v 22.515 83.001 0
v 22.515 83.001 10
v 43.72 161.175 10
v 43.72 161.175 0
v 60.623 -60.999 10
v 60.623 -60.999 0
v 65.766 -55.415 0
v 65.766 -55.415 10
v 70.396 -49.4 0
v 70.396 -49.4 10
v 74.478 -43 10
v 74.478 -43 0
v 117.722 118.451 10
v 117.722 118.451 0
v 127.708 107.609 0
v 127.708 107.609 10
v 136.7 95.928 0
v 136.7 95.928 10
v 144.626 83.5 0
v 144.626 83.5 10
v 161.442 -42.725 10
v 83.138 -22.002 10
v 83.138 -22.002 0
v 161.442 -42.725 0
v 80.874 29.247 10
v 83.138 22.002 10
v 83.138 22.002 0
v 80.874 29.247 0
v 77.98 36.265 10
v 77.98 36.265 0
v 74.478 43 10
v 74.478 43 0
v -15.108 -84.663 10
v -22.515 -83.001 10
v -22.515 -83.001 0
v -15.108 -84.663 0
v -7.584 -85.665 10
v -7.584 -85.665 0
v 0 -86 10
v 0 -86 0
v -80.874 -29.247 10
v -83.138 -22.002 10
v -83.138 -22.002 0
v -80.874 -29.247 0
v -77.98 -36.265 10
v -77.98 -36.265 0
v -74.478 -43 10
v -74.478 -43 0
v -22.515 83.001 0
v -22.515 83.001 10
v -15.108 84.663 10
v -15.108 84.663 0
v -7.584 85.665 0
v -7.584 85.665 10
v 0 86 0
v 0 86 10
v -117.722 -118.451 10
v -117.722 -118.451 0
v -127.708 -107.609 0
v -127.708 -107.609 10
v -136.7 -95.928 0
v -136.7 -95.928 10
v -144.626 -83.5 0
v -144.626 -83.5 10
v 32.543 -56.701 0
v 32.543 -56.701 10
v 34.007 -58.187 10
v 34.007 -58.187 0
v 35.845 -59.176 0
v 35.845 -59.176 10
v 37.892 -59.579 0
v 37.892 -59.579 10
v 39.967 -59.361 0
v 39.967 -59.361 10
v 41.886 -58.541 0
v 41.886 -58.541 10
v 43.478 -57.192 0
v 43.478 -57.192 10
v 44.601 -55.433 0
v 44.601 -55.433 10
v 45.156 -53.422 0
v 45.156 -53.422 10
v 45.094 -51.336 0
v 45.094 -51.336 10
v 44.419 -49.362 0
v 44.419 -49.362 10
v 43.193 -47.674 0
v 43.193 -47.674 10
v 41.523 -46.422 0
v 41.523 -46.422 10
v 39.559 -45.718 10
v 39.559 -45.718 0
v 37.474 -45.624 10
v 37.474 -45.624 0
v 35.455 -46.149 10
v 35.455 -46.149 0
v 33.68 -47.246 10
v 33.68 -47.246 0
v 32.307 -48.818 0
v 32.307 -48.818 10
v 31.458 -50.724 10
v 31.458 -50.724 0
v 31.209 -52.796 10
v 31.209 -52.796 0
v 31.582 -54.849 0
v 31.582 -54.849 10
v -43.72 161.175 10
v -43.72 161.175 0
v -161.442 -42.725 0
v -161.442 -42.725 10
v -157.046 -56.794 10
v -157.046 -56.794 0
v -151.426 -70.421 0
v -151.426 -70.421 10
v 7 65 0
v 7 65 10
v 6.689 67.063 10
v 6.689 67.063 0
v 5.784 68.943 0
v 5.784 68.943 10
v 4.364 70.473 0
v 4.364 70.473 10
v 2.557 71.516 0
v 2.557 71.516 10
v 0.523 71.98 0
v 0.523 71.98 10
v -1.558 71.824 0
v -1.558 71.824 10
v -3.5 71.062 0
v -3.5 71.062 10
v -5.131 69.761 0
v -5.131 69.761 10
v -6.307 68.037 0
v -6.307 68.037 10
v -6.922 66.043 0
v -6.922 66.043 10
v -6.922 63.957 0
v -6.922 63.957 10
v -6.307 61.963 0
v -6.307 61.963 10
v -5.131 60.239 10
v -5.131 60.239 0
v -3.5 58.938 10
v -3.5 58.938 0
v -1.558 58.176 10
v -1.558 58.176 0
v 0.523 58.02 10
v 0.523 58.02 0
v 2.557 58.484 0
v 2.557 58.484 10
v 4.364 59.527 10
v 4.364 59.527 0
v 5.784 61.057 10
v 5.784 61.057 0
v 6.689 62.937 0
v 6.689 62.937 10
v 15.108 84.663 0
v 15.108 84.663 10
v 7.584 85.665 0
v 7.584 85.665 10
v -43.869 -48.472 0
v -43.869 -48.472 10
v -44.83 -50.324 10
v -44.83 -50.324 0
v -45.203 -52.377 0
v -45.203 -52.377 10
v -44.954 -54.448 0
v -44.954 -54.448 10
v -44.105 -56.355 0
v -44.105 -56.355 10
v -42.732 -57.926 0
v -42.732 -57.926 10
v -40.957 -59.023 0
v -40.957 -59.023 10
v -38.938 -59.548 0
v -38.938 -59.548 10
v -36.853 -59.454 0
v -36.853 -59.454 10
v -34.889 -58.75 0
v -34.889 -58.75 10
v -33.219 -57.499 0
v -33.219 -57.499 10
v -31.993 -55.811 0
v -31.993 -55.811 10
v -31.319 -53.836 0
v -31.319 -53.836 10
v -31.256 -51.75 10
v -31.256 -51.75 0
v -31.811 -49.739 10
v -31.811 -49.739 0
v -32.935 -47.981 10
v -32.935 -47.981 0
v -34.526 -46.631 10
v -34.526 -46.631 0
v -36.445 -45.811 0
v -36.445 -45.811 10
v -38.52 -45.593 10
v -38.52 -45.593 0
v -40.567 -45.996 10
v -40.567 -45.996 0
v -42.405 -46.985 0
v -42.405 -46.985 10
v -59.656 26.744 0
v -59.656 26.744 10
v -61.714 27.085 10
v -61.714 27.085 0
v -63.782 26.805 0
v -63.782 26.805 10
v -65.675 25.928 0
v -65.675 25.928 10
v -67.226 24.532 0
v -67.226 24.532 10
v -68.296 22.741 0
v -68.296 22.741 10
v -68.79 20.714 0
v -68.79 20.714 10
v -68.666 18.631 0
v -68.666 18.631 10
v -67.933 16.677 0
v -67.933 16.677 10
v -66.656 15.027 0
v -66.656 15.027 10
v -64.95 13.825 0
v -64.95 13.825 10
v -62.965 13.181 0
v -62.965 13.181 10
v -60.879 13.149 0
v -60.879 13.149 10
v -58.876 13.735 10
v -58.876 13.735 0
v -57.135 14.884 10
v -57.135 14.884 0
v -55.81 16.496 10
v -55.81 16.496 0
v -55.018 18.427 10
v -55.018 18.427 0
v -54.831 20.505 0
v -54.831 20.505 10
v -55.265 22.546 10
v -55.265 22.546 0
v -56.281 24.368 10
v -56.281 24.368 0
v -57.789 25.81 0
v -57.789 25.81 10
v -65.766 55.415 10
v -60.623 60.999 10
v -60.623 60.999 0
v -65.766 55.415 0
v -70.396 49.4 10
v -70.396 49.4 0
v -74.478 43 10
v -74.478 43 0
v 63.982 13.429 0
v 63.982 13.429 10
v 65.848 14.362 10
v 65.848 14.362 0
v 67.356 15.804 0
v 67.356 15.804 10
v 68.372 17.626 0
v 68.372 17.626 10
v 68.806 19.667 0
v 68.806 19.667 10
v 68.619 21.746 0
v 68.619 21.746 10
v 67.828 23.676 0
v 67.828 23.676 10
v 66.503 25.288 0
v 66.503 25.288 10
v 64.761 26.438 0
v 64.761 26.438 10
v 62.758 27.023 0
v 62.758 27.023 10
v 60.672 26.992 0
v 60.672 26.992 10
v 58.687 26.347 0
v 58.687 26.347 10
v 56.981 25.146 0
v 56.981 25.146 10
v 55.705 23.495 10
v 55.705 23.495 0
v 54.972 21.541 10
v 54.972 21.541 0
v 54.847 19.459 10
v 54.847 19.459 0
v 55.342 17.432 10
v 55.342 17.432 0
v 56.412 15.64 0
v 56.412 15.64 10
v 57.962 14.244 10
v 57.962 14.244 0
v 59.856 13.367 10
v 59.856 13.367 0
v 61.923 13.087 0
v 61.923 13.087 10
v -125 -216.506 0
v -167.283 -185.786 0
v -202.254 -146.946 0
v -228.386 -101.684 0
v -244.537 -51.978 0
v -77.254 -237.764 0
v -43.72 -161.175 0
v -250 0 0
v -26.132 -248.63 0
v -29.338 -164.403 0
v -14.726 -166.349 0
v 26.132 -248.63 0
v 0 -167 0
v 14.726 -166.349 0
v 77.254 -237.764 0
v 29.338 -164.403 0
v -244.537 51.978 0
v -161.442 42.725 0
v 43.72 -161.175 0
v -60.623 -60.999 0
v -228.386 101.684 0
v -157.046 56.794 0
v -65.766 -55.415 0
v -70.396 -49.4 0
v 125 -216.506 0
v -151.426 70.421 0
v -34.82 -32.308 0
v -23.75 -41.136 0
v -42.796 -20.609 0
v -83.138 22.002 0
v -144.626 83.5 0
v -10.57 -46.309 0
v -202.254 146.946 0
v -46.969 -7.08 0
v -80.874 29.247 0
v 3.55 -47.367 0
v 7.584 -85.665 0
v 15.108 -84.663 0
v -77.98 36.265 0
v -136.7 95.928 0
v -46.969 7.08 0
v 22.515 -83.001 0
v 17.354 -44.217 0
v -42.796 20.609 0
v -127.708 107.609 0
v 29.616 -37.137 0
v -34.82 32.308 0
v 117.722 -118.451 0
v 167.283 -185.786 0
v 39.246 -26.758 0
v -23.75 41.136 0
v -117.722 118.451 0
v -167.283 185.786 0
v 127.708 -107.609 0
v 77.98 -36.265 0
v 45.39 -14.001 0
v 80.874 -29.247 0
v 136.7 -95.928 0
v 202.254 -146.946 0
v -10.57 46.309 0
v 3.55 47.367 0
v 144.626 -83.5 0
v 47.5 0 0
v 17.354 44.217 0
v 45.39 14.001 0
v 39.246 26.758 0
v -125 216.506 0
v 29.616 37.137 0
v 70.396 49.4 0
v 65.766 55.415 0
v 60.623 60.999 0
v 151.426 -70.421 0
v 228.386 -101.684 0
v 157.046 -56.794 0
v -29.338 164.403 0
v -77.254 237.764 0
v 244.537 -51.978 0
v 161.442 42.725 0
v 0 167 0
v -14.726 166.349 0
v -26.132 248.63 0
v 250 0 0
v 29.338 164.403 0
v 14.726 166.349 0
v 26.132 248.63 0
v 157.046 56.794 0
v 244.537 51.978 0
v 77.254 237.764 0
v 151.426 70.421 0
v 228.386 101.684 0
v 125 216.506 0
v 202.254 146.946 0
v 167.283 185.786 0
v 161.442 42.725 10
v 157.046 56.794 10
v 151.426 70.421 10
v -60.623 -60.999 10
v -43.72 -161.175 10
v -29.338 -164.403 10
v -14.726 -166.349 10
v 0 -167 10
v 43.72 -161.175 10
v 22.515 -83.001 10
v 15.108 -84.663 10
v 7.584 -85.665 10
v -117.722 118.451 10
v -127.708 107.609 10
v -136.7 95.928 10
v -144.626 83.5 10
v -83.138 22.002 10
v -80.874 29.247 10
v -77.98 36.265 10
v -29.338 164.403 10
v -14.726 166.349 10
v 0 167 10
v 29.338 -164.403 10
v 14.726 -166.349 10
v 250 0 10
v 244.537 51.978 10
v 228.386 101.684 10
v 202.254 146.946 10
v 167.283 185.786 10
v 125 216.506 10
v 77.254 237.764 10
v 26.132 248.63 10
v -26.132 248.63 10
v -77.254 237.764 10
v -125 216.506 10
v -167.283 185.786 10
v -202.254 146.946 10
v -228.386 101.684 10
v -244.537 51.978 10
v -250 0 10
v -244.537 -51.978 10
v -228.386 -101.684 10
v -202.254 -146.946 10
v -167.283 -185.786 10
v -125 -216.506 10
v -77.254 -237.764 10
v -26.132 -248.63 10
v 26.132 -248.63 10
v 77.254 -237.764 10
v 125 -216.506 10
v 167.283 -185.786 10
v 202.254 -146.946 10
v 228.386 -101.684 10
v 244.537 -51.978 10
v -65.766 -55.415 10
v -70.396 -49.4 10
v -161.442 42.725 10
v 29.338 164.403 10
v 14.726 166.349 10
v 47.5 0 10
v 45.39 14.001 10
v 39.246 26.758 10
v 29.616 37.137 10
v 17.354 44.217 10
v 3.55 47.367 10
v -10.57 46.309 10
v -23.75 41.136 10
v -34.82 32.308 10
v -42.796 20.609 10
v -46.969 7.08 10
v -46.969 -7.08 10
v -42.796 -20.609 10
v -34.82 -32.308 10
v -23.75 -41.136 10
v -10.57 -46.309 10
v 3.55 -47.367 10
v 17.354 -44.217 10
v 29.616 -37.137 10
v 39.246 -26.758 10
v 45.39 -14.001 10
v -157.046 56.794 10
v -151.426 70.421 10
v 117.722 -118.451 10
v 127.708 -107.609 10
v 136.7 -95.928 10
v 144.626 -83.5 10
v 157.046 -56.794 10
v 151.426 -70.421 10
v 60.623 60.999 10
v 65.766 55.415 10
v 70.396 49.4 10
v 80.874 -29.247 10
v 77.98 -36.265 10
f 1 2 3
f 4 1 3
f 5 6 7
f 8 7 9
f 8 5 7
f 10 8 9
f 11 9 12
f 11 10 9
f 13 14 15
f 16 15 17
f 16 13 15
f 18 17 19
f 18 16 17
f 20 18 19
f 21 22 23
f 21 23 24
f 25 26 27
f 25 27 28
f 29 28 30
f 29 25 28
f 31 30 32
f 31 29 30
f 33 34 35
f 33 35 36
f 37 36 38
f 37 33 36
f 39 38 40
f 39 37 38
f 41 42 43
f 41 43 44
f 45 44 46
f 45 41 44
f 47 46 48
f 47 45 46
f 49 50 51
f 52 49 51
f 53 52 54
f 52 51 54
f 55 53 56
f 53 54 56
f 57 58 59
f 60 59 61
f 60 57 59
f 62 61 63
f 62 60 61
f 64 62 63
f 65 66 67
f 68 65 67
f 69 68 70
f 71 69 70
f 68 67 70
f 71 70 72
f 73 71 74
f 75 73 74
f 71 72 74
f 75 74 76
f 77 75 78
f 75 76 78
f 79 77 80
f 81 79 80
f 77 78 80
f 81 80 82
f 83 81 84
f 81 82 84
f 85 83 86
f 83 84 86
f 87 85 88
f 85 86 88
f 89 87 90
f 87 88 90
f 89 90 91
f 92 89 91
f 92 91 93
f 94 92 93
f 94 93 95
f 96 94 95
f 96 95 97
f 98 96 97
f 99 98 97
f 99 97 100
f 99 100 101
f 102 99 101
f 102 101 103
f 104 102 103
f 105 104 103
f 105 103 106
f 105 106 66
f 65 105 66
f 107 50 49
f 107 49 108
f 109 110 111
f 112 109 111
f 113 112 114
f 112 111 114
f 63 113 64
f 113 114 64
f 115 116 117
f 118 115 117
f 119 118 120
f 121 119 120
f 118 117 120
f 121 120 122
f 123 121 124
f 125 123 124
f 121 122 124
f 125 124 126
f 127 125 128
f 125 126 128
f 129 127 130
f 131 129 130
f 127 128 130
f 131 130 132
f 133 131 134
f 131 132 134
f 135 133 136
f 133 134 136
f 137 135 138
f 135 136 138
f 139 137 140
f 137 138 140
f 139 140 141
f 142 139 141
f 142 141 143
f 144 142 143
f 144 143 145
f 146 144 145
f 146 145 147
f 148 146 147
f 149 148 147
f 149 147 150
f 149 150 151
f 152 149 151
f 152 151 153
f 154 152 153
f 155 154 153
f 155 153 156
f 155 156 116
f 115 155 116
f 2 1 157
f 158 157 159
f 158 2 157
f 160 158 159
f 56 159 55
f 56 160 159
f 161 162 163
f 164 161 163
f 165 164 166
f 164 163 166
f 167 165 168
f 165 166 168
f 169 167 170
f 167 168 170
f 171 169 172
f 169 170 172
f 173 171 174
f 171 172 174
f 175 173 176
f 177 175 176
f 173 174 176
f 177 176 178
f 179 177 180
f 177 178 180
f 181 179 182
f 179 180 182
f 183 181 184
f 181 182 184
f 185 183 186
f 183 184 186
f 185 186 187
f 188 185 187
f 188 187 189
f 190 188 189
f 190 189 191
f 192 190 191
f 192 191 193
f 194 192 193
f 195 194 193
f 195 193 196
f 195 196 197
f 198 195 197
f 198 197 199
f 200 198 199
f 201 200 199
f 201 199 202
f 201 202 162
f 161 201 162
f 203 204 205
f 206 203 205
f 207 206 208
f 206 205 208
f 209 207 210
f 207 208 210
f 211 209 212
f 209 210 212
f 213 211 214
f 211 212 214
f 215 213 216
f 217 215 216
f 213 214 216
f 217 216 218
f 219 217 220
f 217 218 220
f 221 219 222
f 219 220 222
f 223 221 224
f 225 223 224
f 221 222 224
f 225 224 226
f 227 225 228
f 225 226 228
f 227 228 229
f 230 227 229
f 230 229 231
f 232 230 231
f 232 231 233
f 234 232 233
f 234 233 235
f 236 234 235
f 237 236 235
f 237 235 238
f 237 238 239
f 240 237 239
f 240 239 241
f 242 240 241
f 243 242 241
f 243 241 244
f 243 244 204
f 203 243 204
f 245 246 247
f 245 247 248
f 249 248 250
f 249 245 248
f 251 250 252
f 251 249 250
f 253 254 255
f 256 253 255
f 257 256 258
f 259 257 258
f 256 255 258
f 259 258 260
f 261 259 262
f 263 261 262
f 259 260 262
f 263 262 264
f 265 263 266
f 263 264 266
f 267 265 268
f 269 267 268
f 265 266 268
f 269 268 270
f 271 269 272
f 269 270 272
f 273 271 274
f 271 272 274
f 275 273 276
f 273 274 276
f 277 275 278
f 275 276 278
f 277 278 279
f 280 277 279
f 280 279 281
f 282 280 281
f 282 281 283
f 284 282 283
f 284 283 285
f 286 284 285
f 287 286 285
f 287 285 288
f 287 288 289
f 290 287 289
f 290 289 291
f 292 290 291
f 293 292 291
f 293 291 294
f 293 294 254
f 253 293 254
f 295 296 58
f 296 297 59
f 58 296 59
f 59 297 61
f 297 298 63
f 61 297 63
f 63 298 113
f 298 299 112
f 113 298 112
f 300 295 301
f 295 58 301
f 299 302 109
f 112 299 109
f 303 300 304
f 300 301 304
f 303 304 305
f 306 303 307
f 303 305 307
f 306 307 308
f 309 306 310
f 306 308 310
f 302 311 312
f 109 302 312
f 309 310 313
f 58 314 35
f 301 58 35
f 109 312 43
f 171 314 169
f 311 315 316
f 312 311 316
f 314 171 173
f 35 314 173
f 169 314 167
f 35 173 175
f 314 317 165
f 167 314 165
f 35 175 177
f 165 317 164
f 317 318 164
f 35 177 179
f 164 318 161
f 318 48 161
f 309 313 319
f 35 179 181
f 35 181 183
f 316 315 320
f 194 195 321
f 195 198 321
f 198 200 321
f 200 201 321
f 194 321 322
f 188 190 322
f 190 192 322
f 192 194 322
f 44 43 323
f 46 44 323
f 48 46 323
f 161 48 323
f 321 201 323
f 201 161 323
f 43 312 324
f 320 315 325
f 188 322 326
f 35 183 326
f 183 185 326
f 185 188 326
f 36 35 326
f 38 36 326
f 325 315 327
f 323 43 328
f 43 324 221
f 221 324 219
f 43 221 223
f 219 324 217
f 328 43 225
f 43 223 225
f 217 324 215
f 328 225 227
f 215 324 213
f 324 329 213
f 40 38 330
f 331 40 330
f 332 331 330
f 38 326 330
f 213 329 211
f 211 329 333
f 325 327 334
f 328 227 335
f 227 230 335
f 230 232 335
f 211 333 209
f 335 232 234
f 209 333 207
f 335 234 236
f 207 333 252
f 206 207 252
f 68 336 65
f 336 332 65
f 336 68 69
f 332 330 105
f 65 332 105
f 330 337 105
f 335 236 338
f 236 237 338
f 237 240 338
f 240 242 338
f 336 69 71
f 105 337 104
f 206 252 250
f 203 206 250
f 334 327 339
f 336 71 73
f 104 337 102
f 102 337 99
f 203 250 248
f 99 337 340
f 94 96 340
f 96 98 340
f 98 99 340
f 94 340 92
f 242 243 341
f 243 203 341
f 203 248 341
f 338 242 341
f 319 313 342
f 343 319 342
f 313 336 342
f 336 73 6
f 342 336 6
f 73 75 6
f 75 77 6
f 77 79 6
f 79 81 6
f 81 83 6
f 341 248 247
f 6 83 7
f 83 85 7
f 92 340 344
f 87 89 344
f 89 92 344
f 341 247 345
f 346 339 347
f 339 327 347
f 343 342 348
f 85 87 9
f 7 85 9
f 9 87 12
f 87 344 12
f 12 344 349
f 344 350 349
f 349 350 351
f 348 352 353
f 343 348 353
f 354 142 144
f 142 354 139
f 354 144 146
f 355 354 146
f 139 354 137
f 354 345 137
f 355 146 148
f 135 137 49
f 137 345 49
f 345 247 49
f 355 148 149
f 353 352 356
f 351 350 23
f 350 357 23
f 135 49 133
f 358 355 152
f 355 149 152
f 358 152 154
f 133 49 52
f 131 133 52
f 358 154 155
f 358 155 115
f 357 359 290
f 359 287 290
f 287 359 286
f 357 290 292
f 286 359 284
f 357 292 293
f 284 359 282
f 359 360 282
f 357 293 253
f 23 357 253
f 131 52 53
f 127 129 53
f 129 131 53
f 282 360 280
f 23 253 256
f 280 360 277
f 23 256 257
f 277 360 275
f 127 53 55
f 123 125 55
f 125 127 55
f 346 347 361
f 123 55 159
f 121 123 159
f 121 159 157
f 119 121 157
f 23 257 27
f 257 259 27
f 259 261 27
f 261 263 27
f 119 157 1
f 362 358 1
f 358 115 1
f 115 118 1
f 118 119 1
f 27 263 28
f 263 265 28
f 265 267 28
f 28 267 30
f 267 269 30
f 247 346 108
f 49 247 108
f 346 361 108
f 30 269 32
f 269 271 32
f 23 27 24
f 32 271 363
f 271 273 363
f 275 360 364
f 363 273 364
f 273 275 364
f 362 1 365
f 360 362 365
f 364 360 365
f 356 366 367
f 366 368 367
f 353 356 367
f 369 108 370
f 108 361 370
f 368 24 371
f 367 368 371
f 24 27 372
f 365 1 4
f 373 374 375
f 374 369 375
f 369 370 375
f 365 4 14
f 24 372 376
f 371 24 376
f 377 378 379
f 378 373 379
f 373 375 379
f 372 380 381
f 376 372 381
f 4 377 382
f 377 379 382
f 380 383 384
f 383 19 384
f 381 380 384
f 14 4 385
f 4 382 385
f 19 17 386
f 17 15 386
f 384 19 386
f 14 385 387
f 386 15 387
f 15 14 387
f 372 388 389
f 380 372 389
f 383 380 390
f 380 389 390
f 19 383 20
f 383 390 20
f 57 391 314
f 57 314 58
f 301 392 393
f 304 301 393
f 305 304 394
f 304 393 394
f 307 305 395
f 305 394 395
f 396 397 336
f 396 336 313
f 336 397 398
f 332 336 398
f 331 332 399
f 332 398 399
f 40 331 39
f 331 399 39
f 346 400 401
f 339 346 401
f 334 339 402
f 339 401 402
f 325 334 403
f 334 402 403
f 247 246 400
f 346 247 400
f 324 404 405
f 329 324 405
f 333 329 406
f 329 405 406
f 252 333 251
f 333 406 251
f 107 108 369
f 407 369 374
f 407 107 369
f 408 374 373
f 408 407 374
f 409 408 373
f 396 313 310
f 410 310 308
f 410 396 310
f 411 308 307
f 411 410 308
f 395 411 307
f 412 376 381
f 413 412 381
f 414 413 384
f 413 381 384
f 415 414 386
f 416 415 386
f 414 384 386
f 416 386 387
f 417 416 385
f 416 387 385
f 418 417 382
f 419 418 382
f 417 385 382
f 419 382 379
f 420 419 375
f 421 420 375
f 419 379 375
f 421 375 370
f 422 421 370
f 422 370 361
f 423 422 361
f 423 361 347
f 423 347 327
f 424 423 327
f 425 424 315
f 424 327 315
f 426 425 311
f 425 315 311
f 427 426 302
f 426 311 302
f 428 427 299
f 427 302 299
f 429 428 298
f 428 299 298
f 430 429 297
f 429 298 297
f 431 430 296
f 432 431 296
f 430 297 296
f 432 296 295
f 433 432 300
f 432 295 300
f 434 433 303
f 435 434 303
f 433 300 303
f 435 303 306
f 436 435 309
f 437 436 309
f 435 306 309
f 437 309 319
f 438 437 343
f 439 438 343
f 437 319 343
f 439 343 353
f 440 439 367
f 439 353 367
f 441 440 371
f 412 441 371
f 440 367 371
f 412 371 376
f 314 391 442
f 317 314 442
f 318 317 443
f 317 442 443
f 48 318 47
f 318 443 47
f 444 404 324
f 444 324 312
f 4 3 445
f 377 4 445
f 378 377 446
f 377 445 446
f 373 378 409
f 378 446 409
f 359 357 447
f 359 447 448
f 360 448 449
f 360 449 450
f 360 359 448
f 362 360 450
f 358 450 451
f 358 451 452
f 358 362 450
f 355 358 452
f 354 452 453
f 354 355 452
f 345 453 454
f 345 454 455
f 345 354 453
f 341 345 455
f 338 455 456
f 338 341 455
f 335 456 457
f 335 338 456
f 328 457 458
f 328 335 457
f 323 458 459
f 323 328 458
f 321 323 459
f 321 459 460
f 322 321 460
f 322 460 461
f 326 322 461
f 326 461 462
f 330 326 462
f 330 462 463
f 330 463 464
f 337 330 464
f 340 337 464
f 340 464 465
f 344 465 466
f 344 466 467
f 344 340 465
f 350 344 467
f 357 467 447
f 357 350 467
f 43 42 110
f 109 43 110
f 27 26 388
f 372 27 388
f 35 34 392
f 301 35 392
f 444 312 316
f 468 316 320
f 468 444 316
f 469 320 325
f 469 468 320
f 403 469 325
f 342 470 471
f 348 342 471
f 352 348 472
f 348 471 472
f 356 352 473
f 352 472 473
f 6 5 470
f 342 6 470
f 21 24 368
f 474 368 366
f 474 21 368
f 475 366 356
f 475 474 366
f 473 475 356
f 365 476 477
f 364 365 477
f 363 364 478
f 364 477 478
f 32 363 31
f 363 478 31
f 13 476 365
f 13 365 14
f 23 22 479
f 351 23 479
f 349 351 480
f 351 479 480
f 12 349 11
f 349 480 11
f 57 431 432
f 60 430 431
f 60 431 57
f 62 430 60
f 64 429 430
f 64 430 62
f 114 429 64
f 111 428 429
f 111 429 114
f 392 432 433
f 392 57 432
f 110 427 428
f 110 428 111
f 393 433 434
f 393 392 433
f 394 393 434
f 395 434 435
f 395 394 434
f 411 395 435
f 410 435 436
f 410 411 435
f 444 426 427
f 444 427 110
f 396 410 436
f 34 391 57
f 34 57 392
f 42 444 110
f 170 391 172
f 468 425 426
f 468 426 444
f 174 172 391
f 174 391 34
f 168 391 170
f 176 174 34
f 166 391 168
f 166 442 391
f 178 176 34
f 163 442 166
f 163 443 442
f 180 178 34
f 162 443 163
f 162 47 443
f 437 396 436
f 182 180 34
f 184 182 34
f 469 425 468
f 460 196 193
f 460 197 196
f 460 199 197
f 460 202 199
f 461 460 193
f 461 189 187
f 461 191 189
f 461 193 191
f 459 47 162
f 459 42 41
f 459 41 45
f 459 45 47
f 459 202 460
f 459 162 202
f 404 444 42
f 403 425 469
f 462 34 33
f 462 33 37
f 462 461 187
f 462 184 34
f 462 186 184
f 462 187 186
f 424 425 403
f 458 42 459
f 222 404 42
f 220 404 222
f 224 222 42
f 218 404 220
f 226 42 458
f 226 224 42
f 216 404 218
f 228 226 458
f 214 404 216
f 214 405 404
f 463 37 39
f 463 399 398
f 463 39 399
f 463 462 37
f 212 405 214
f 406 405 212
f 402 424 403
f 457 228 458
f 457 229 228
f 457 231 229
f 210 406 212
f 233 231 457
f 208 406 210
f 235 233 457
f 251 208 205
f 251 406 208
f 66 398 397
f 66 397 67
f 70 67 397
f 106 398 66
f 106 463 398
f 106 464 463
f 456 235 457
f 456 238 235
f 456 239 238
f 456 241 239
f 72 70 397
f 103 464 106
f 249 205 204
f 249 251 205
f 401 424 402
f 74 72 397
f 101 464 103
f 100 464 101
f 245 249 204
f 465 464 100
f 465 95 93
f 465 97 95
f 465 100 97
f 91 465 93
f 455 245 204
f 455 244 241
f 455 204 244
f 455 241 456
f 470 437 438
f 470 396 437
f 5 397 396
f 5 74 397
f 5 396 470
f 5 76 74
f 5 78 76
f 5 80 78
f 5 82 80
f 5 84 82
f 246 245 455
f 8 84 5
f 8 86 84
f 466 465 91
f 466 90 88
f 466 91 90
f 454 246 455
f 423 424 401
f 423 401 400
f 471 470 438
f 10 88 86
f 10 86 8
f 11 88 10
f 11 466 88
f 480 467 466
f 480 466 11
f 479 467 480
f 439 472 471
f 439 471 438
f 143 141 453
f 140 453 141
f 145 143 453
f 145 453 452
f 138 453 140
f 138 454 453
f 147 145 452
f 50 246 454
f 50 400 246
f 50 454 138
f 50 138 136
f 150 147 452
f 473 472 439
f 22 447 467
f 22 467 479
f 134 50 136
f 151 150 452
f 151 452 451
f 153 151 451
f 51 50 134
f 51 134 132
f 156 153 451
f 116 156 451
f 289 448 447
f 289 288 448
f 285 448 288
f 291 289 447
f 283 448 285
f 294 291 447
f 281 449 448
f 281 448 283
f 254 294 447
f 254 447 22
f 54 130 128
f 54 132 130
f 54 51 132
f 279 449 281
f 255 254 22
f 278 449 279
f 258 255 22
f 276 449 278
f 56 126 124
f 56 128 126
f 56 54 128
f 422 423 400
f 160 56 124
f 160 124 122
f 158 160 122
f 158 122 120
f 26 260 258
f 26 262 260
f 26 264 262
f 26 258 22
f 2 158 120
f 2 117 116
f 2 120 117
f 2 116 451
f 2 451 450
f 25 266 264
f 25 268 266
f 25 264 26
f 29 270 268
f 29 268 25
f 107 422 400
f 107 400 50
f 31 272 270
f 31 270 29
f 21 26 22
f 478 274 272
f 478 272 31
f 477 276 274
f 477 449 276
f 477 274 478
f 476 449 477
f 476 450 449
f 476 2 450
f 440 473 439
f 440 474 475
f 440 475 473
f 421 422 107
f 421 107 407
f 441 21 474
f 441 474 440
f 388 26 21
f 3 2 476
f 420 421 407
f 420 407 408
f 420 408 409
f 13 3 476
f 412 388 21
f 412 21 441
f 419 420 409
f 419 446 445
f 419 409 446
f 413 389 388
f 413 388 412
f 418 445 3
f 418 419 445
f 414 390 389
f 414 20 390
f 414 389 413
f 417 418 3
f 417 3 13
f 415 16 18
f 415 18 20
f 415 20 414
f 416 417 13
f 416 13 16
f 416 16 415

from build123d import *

# Parameters (mm, degrees)
SKETCH_R                = 250
SKETCH_R_2              = 47.5
PAD_DEPTH               = 10
POCKET_DEPTH            = 1424.355977
POCKET_MIRRORED_2_DEPTH = 1424.355977
POLARPATTERN_COUNT      = 6
SKETCH002_R             = 7
POCKET001_DEPTH         = 1424.355977
POLARPATTERN001_COUNT   = 5


with BuildPart() as part:
    # Sketch → Pad (new body)
    with BuildSketch(Plane.XY):
        Circle(SKETCH_R)
        Circle(SKETCH_R_2, mode=Mode.SUBTRACT)
    extrude(amount=PAD_DEPTH)

    # Sketch001 (on Face4 of Pad) → Pocket (cut, through all)
    with BuildSketch(Plane.XY.offset(10)):
        with BuildLine():
            Line((22.514747, 83.000519), (43.720498, 161.175426))
            ThreePointArc((43.720498, 161.175426), (22.053387, 165.537452), (0, 167))
            Line((0, 86), (0, 167))
            ThreePointArc((22.514747, 83.000519), (11.356834, 85.246832), (0, 86))
        make_face()
    pocket = extrude(amount=-POCKET_DEPTH, mode=Mode.SUBTRACT)

    # Sketch001 Mirrored 2 → Pocket Mirrored 2 (cut, through all)
    with BuildSketch(Plane(origin=(0, 0, 10), x_dir=(-1, 0, 0), z_dir=(0, 0, -1))):
        with BuildLine():
            Line((22.514747, 83.000519), (43.720498, 161.175426))
            ThreePointArc((43.720498, 161.175426), (22.053387, 165.537452), (0, 167))
            Line((0, 86), (0, 167))
            ThreePointArc((22.514747, 83.000519), (11.356834, 85.246832), (0, 86))
        make_face()
    pocket_mirrored_2 = extrude(amount=POCKET_MIRRORED_2_DEPTH, mode=Mode.SUBTRACT)

    # PolarPattern: Pocket, Pocket Mirrored 2 ×6 about axis
    polarpattern_axis = Axis((0, 0, 10), (0, 0, 1))
    for i in range(1, POLARPATTERN_COUNT):
        add(pocket.rotate(polarpattern_axis, i * 360 / POLARPATTERN_COUNT), mode=Mode.SUBTRACT)
        add(pocket_mirrored_2.rotate(polarpattern_axis, i * 360 / POLARPATTERN_COUNT), mode=Mode.SUBTRACT)

    # Sketch002 (on Face4 of Pad) → Pocket001 (cut, through all)
    with BuildSketch(Plane.XY.offset(10)):
        with Locations((0, 65)):
            Circle(SKETCH002_R)
    pocket001 = extrude(amount=-POCKET001_DEPTH, mode=Mode.SUBTRACT)

    # PolarPattern001: Pocket001 ×5 about axis
    polarpattern001_axis = Axis((0, 0, 10), (0, 0, 1))
    for i in range(1, POLARPATTERN001_COUNT):
        add(pocket001.rotate(polarpattern001_axis, i * 360 / POLARPATTERN001_COUNT), mode=Mode.SUBTRACT)


solid = part.part
